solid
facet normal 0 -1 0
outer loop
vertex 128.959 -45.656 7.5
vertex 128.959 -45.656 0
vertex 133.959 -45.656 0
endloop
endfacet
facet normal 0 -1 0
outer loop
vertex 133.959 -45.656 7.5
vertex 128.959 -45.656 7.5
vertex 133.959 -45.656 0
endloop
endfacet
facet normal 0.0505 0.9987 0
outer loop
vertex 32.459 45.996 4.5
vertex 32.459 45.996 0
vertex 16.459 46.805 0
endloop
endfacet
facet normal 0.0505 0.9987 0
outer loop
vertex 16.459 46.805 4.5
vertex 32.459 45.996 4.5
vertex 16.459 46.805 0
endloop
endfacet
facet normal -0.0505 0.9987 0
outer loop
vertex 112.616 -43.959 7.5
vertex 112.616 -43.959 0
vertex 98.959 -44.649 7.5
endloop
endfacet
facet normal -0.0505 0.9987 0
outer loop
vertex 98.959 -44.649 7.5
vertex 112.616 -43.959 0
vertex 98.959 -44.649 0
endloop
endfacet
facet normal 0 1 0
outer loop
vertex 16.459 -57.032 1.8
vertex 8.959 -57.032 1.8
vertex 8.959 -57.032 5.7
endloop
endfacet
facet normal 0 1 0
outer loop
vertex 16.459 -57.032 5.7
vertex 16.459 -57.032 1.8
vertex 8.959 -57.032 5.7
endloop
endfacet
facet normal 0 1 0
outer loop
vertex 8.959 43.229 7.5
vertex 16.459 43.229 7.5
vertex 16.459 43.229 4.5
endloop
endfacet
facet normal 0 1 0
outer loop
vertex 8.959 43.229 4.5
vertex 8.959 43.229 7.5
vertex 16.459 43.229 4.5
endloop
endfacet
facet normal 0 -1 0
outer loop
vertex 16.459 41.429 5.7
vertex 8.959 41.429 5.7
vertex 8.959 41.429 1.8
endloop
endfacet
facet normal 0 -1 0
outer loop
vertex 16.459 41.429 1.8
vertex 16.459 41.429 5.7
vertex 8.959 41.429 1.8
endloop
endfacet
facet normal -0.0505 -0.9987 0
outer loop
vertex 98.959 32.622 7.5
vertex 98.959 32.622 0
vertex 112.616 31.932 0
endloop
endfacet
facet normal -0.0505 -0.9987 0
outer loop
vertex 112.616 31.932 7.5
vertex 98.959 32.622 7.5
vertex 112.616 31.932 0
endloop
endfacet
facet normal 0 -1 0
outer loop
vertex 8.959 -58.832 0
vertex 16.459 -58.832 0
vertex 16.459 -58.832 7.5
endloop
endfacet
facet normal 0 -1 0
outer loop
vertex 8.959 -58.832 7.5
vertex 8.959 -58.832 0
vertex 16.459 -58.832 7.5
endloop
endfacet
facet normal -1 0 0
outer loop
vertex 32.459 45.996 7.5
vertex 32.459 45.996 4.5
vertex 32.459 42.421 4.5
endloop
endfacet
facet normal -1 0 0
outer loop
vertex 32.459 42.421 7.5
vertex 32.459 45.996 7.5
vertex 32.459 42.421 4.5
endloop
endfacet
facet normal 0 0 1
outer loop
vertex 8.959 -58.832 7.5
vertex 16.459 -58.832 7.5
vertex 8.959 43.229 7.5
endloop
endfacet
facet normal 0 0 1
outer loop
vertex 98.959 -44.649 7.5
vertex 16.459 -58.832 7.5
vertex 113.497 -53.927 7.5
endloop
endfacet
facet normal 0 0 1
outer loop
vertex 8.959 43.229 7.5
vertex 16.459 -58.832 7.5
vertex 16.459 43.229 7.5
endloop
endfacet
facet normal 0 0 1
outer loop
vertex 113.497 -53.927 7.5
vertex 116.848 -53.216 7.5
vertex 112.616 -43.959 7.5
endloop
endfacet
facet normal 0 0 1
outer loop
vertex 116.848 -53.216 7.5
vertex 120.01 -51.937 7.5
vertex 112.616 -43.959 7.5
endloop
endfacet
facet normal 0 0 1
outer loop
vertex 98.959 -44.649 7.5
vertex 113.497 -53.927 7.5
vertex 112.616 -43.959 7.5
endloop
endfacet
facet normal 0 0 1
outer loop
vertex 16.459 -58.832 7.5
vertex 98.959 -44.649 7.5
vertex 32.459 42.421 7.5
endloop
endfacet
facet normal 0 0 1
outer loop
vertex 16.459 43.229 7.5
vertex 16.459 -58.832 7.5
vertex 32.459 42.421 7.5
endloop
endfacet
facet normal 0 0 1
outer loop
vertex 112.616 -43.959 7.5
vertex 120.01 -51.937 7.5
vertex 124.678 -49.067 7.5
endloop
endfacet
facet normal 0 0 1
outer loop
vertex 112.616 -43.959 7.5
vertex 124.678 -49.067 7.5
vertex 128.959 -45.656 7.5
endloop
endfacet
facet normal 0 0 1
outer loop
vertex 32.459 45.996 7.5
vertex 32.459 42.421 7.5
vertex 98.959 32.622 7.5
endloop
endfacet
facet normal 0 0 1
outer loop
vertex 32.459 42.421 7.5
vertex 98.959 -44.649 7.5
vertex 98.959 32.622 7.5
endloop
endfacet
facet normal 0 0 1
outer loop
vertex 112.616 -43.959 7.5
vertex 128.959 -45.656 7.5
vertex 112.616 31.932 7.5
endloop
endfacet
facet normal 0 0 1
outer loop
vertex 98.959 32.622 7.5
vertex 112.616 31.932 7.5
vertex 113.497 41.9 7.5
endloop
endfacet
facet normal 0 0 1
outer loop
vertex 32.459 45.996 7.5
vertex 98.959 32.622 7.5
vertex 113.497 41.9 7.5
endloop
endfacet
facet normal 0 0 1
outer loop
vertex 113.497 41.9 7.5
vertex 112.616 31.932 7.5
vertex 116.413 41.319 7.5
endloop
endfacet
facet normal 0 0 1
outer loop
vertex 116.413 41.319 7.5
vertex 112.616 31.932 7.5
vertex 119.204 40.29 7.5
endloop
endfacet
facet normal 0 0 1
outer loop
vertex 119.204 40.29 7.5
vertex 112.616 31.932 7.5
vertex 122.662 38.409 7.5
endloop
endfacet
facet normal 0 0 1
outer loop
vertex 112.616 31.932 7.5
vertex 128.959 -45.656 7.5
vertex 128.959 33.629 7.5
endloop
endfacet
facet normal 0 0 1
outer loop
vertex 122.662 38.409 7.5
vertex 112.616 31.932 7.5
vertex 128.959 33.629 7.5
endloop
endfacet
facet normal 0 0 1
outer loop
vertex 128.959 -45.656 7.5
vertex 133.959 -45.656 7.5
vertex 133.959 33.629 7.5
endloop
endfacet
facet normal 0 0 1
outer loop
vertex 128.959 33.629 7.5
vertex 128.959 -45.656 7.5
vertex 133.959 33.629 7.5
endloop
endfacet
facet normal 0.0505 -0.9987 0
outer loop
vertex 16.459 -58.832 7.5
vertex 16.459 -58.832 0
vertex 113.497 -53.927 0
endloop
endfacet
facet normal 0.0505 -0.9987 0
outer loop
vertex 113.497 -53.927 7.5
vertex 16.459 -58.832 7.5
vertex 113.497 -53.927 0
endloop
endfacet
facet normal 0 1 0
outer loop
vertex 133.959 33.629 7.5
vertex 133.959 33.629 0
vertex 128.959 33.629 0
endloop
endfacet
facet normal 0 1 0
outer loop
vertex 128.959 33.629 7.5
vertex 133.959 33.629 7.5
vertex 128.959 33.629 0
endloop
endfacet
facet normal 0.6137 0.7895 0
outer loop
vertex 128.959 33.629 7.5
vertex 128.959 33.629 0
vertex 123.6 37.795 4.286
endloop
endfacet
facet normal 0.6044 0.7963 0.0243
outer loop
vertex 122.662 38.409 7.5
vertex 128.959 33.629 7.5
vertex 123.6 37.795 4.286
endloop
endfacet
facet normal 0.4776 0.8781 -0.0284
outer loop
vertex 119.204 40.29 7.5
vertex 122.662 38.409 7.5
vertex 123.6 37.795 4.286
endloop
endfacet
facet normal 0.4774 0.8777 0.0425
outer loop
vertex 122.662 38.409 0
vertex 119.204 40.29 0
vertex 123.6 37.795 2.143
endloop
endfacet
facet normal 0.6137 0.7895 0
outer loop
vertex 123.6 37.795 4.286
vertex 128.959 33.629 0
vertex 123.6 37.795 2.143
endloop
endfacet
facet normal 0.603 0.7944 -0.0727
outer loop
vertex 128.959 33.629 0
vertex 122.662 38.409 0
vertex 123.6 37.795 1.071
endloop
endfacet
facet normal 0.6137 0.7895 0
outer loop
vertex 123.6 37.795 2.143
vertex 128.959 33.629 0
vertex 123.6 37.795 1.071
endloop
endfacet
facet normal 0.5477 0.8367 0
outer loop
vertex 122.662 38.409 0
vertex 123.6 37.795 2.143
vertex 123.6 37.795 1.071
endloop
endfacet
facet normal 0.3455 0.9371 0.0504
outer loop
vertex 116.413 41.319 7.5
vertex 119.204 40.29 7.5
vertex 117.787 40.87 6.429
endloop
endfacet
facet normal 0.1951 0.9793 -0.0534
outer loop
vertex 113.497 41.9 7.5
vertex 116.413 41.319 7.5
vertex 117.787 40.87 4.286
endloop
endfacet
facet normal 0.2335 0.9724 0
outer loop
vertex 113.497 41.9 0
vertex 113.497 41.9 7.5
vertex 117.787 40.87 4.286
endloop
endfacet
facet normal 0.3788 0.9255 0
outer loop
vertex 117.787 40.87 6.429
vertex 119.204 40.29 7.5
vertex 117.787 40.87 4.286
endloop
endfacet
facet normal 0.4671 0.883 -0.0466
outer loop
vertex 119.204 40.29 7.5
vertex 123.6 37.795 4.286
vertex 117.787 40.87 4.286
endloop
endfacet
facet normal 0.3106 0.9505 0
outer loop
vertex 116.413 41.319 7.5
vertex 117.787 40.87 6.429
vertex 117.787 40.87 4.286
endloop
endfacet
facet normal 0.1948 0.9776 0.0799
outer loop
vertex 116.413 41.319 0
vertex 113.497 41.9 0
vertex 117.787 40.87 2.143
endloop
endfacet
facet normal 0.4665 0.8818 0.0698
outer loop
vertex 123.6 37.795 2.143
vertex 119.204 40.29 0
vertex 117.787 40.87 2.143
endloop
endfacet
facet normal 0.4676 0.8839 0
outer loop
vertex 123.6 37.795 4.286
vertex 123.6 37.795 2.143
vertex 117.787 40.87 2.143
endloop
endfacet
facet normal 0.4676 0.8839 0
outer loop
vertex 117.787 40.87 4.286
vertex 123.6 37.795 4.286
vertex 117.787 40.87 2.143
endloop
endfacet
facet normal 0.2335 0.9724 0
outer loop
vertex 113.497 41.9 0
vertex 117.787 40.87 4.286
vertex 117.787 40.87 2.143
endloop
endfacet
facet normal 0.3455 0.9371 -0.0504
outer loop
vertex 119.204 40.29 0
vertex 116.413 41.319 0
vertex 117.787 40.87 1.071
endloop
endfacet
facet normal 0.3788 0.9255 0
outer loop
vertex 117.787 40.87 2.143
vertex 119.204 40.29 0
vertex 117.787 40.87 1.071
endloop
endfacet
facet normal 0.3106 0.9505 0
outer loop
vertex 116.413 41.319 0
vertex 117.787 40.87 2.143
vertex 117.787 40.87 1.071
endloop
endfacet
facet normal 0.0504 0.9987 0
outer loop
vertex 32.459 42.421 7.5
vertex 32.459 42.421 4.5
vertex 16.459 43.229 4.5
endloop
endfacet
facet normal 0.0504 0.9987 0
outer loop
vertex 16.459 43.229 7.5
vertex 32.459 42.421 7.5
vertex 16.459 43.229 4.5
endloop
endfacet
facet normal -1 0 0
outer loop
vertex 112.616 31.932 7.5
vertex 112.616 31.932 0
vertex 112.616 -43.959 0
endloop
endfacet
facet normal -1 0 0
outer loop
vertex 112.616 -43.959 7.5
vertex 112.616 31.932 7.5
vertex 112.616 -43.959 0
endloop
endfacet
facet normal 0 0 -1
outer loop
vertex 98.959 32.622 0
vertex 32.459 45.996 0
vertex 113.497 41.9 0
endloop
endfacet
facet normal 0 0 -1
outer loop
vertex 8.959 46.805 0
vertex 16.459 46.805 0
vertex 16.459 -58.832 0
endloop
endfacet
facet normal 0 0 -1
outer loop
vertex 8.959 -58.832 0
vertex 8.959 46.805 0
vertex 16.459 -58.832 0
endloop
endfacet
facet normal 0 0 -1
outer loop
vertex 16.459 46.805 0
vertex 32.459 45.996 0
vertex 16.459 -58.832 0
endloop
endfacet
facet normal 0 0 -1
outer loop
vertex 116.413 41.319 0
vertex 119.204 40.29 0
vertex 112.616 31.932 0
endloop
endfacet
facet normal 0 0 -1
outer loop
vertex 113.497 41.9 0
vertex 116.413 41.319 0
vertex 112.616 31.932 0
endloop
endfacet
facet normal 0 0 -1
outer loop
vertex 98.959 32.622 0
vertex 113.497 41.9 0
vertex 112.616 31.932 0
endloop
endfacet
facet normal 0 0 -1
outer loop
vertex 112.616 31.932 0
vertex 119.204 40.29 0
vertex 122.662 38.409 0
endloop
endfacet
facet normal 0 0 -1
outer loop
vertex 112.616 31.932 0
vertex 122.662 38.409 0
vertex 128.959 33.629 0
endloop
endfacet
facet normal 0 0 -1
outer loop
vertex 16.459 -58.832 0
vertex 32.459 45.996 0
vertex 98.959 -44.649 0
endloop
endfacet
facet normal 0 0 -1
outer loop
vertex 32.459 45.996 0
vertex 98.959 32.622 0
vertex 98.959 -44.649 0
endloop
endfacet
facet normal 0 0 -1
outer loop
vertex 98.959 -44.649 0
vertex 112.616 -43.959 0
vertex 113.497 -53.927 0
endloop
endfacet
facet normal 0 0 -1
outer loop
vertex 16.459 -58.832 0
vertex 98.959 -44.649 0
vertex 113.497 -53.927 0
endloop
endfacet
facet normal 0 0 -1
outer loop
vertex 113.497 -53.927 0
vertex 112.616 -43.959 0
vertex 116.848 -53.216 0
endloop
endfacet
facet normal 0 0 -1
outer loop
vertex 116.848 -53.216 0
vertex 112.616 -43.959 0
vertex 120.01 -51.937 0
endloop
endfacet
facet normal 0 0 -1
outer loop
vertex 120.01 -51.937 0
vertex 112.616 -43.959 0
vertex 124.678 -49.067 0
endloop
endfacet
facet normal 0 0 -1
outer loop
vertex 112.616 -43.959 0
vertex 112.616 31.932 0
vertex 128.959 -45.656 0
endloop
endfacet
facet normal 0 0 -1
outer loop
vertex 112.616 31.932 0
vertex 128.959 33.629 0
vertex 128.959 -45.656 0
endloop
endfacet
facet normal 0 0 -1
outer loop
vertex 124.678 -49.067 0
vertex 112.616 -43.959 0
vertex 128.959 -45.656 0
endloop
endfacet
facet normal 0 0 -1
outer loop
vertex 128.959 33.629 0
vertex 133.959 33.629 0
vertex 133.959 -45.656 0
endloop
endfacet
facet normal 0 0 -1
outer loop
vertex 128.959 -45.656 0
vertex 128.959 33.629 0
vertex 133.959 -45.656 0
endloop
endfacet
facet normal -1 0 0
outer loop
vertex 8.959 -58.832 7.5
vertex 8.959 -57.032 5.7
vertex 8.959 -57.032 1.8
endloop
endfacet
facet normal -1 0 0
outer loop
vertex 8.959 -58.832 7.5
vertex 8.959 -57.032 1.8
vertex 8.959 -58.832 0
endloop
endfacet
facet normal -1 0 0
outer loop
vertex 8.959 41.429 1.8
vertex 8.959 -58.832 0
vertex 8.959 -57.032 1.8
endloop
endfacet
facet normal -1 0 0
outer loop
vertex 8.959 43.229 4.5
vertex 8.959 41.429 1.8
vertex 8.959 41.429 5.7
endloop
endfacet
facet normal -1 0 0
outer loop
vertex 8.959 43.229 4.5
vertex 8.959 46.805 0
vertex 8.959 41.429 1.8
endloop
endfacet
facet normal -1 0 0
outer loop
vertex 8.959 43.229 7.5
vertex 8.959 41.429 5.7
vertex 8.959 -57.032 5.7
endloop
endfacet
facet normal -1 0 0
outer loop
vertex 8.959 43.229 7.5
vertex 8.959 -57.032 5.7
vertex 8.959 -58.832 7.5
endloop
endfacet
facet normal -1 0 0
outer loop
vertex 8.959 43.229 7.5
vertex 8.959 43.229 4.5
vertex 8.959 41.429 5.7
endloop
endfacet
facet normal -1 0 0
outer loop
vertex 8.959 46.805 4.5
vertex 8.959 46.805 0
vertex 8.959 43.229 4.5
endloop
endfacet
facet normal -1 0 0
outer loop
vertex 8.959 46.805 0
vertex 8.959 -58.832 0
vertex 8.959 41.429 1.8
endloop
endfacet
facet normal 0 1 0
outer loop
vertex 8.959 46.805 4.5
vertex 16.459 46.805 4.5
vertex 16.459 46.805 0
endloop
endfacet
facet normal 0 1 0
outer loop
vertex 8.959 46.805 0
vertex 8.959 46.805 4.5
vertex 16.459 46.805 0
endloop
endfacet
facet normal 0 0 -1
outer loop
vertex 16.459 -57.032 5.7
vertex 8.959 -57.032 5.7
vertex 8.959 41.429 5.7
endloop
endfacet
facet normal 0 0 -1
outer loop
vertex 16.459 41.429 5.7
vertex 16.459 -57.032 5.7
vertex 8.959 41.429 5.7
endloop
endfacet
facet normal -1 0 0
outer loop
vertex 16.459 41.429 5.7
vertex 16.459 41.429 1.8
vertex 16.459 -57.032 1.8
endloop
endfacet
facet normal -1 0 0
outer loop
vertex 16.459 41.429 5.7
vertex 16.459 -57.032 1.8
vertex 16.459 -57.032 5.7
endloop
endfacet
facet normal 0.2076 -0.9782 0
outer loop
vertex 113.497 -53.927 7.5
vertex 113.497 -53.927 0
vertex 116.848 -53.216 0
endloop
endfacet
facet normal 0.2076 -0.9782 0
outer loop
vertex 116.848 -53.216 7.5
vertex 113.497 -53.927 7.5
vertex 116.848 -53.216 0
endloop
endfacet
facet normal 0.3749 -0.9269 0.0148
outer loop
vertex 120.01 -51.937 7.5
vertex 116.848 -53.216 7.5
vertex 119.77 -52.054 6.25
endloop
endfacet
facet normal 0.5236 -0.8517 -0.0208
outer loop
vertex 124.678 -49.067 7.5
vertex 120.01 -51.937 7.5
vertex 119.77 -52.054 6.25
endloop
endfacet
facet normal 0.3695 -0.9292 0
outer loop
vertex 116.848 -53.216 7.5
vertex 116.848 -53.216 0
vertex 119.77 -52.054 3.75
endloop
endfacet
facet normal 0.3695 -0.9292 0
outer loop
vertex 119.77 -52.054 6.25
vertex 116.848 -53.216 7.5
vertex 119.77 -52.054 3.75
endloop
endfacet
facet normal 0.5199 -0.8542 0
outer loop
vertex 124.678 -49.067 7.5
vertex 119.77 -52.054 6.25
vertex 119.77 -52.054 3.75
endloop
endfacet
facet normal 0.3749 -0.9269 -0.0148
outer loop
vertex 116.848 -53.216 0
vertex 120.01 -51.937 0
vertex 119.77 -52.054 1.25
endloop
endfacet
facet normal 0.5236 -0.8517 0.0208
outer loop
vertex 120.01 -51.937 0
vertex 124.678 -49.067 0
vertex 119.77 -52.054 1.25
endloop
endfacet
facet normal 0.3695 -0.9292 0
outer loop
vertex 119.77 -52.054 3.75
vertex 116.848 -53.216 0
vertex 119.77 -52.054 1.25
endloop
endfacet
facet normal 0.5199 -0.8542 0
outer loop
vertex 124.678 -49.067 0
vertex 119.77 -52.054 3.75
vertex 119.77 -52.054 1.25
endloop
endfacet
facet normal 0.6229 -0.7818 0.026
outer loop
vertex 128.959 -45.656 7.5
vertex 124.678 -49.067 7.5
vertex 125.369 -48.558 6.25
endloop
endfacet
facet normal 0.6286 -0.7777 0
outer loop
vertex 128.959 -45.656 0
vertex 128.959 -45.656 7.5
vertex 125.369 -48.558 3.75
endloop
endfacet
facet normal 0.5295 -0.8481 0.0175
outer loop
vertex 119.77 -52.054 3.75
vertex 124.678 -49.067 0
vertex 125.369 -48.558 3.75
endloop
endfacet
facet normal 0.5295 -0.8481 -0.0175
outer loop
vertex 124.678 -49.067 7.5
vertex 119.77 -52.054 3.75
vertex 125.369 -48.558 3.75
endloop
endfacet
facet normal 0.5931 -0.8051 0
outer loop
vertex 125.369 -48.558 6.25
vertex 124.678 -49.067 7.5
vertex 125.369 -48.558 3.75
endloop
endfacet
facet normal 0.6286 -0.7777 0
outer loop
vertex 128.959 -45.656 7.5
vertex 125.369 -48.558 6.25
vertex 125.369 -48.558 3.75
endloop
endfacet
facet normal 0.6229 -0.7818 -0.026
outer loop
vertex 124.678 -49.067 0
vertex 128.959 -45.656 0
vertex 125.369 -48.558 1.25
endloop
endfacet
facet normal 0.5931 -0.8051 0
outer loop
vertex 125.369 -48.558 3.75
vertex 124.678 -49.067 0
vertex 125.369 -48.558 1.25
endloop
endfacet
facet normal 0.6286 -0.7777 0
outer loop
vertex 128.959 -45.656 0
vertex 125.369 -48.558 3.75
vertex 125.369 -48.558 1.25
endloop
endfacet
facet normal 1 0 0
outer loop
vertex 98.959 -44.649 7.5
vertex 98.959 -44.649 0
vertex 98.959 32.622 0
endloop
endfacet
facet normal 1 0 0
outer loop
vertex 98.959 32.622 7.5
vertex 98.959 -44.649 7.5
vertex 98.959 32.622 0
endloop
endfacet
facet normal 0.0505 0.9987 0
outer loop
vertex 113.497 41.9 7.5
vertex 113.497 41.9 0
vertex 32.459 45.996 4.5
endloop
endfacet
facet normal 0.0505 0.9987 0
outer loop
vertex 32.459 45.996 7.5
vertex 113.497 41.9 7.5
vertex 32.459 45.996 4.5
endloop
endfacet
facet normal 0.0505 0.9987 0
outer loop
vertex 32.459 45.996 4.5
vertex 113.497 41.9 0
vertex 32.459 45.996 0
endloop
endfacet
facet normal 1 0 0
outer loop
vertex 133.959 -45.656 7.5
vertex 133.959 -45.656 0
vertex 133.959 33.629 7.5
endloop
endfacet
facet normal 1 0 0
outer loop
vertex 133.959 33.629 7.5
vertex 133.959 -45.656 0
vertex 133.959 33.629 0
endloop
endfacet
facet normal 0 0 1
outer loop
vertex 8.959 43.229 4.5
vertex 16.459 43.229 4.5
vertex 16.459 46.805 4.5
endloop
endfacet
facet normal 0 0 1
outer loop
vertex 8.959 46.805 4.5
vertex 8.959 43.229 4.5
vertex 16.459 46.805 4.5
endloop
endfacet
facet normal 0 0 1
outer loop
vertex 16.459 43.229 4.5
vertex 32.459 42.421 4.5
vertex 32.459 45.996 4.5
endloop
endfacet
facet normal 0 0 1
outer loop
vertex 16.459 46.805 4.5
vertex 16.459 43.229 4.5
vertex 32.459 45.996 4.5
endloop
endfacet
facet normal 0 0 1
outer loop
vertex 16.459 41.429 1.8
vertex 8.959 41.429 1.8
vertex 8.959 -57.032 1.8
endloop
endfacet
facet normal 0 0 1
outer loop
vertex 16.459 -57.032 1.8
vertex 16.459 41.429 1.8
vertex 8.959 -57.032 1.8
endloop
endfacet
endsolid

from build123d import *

# Parameters (mm, degrees)
STOCK_BATTERY_BASE_1_DEPTH   = 7.5
STOCK_BATTERY_BASE_1_2_DEPTH = 4.5
BOSS_EXTRUDE1_DEPTH          = 7.5
CUT_EXTRUDE1_DEPTH           = 7.5


# Read off the part's stored shape, not the designer's step: Stock-battery base-1
with BuildPart() as part:
    # Stock-battery base-1 outline → Stock-battery base-1 (new body)
    with BuildSketch(Plane.XY):
        with BuildLine():
            Line((32.459100066, 42.420690995), (16.459100066, 43.22938712))
            Line((16.459100066, 43.22938712), (16.459100066, -58.832087736))
            Line((16.459100066, -58.832087736), (113.496599029, -53.92747215))
            add(Edge.make_bspline(
                [(113.496599029, -53.92747215), (114.973875685, -53.76034768), (116.389465073, -53.408303088), (118.438931288, -52.658652366), (119.109837198, -52.372048444), (120.430638868, -51.735858399), (121.082915856, -51.384782434), (122.988929436, -50.267489711), (124.197203446, -49.437169981), (126.541735842, -47.677906536), (127.677620036, -46.748450374), (128.850515141, -45.74891878), (128.904828159, -45.702543351), (128.959100066, -45.656116492)],
                knots=[0, 0, 0, 0, 0.125, 0.125, 0.1875, 0.1875, 0.25, 0.25, 0.375, 0.375, 0.5, 0.5, 0.506074438, 0.506074438, 0.506074438, 0.506074438], degree=3))
            Line((128.959100066, -45.656116492), (133.959100066, -45.656116492))
            Line((133.959100066, -45.656116492), (133.959100066, 33.628624999))
            Line((133.959100066, 33.628624999), (128.959100066, 33.628624999))
            add(Edge.make_bspline(
                [(128.959100066, 33.628624999), (128.913387154, 33.667730585), (127.751192536, 34.660386778), (126.568806099, 35.629041088), (124.805320754, 36.953884089), (124.207009004, 37.38378621), (122.992052543, 38.206145046), (122.374602128, 38.599251589), (120.484333172, 39.709851881), (119.174169326, 40.359663675), (117.093195419, 41.124643977), (116.387101294, 41.341482025), (114.957490187, 41.687263925), (114.232477088, 41.816732683), (113.496599029, 41.899982649)],
                knots=[0.494878569, 0.494878569, 0.494878569, 0.494878569, 0.5, 0.625, 0.625, 0.6875, 0.6875, 0.75, 0.75, 0.875, 0.875, 0.9375, 0.9375, 1, 1, 1, 1], degree=3))
            Line((113.496599029, 41.899982649), (32.459100066, 45.99590211))
            Line((32.459100066, 45.99590211), (32.459100066, 42.420690995))
        make_face()
        Polygon((112.616329261, 31.931709487), (112.616012614, -43.959214992), (98.959100066, -44.649483258), (98.959100066, 32.621993758), align=None, mode=Mode.SUBTRACT)
    extrude(amount=STOCK_BATTERY_BASE_1_DEPTH)

    # Stock-battery base-1 2 outline → Stock-battery base-1 2 (add)
    with BuildSketch(Plane.XY):
        Polygon((32.459100066, 45.99590211), (16.459100066, 46.804598235), (16.459100066, 43.22938712), (32.459100066, 42.420690995), align=None)
    extrude(amount=STOCK_BATTERY_BASE_1_2_DEPTH)

    # Sketch1 → Boss-Extrude1 (add)
    with BuildSketch(Plane.ZY.offset(-16.459100066)):
        Polygon((0, 46.804598235), (0, -58.832087736), (7.5, -58.832087736), (7.5, 43.22938712), (4.5, 43.22938712), (4.5, 46.804598235), align=None)
    extrude(amount=BOSS_EXTRUDE1_DEPTH)

    # Sketch2 → Cut-Extrude1 (cut)
    with BuildSketch(Plane.ZY.offset(-8.959100066)):
        Polygon((2.7, 41.42938712), (1.8, 41.42938712), (1.8, -57.032087736), (5.7, -57.032087736), (5.7, 41.42938712), align=None)
    extrude(amount=-CUT_EXTRUDE1_DEPTH, mode=Mode.SUBTRACT)


solid = part.part
